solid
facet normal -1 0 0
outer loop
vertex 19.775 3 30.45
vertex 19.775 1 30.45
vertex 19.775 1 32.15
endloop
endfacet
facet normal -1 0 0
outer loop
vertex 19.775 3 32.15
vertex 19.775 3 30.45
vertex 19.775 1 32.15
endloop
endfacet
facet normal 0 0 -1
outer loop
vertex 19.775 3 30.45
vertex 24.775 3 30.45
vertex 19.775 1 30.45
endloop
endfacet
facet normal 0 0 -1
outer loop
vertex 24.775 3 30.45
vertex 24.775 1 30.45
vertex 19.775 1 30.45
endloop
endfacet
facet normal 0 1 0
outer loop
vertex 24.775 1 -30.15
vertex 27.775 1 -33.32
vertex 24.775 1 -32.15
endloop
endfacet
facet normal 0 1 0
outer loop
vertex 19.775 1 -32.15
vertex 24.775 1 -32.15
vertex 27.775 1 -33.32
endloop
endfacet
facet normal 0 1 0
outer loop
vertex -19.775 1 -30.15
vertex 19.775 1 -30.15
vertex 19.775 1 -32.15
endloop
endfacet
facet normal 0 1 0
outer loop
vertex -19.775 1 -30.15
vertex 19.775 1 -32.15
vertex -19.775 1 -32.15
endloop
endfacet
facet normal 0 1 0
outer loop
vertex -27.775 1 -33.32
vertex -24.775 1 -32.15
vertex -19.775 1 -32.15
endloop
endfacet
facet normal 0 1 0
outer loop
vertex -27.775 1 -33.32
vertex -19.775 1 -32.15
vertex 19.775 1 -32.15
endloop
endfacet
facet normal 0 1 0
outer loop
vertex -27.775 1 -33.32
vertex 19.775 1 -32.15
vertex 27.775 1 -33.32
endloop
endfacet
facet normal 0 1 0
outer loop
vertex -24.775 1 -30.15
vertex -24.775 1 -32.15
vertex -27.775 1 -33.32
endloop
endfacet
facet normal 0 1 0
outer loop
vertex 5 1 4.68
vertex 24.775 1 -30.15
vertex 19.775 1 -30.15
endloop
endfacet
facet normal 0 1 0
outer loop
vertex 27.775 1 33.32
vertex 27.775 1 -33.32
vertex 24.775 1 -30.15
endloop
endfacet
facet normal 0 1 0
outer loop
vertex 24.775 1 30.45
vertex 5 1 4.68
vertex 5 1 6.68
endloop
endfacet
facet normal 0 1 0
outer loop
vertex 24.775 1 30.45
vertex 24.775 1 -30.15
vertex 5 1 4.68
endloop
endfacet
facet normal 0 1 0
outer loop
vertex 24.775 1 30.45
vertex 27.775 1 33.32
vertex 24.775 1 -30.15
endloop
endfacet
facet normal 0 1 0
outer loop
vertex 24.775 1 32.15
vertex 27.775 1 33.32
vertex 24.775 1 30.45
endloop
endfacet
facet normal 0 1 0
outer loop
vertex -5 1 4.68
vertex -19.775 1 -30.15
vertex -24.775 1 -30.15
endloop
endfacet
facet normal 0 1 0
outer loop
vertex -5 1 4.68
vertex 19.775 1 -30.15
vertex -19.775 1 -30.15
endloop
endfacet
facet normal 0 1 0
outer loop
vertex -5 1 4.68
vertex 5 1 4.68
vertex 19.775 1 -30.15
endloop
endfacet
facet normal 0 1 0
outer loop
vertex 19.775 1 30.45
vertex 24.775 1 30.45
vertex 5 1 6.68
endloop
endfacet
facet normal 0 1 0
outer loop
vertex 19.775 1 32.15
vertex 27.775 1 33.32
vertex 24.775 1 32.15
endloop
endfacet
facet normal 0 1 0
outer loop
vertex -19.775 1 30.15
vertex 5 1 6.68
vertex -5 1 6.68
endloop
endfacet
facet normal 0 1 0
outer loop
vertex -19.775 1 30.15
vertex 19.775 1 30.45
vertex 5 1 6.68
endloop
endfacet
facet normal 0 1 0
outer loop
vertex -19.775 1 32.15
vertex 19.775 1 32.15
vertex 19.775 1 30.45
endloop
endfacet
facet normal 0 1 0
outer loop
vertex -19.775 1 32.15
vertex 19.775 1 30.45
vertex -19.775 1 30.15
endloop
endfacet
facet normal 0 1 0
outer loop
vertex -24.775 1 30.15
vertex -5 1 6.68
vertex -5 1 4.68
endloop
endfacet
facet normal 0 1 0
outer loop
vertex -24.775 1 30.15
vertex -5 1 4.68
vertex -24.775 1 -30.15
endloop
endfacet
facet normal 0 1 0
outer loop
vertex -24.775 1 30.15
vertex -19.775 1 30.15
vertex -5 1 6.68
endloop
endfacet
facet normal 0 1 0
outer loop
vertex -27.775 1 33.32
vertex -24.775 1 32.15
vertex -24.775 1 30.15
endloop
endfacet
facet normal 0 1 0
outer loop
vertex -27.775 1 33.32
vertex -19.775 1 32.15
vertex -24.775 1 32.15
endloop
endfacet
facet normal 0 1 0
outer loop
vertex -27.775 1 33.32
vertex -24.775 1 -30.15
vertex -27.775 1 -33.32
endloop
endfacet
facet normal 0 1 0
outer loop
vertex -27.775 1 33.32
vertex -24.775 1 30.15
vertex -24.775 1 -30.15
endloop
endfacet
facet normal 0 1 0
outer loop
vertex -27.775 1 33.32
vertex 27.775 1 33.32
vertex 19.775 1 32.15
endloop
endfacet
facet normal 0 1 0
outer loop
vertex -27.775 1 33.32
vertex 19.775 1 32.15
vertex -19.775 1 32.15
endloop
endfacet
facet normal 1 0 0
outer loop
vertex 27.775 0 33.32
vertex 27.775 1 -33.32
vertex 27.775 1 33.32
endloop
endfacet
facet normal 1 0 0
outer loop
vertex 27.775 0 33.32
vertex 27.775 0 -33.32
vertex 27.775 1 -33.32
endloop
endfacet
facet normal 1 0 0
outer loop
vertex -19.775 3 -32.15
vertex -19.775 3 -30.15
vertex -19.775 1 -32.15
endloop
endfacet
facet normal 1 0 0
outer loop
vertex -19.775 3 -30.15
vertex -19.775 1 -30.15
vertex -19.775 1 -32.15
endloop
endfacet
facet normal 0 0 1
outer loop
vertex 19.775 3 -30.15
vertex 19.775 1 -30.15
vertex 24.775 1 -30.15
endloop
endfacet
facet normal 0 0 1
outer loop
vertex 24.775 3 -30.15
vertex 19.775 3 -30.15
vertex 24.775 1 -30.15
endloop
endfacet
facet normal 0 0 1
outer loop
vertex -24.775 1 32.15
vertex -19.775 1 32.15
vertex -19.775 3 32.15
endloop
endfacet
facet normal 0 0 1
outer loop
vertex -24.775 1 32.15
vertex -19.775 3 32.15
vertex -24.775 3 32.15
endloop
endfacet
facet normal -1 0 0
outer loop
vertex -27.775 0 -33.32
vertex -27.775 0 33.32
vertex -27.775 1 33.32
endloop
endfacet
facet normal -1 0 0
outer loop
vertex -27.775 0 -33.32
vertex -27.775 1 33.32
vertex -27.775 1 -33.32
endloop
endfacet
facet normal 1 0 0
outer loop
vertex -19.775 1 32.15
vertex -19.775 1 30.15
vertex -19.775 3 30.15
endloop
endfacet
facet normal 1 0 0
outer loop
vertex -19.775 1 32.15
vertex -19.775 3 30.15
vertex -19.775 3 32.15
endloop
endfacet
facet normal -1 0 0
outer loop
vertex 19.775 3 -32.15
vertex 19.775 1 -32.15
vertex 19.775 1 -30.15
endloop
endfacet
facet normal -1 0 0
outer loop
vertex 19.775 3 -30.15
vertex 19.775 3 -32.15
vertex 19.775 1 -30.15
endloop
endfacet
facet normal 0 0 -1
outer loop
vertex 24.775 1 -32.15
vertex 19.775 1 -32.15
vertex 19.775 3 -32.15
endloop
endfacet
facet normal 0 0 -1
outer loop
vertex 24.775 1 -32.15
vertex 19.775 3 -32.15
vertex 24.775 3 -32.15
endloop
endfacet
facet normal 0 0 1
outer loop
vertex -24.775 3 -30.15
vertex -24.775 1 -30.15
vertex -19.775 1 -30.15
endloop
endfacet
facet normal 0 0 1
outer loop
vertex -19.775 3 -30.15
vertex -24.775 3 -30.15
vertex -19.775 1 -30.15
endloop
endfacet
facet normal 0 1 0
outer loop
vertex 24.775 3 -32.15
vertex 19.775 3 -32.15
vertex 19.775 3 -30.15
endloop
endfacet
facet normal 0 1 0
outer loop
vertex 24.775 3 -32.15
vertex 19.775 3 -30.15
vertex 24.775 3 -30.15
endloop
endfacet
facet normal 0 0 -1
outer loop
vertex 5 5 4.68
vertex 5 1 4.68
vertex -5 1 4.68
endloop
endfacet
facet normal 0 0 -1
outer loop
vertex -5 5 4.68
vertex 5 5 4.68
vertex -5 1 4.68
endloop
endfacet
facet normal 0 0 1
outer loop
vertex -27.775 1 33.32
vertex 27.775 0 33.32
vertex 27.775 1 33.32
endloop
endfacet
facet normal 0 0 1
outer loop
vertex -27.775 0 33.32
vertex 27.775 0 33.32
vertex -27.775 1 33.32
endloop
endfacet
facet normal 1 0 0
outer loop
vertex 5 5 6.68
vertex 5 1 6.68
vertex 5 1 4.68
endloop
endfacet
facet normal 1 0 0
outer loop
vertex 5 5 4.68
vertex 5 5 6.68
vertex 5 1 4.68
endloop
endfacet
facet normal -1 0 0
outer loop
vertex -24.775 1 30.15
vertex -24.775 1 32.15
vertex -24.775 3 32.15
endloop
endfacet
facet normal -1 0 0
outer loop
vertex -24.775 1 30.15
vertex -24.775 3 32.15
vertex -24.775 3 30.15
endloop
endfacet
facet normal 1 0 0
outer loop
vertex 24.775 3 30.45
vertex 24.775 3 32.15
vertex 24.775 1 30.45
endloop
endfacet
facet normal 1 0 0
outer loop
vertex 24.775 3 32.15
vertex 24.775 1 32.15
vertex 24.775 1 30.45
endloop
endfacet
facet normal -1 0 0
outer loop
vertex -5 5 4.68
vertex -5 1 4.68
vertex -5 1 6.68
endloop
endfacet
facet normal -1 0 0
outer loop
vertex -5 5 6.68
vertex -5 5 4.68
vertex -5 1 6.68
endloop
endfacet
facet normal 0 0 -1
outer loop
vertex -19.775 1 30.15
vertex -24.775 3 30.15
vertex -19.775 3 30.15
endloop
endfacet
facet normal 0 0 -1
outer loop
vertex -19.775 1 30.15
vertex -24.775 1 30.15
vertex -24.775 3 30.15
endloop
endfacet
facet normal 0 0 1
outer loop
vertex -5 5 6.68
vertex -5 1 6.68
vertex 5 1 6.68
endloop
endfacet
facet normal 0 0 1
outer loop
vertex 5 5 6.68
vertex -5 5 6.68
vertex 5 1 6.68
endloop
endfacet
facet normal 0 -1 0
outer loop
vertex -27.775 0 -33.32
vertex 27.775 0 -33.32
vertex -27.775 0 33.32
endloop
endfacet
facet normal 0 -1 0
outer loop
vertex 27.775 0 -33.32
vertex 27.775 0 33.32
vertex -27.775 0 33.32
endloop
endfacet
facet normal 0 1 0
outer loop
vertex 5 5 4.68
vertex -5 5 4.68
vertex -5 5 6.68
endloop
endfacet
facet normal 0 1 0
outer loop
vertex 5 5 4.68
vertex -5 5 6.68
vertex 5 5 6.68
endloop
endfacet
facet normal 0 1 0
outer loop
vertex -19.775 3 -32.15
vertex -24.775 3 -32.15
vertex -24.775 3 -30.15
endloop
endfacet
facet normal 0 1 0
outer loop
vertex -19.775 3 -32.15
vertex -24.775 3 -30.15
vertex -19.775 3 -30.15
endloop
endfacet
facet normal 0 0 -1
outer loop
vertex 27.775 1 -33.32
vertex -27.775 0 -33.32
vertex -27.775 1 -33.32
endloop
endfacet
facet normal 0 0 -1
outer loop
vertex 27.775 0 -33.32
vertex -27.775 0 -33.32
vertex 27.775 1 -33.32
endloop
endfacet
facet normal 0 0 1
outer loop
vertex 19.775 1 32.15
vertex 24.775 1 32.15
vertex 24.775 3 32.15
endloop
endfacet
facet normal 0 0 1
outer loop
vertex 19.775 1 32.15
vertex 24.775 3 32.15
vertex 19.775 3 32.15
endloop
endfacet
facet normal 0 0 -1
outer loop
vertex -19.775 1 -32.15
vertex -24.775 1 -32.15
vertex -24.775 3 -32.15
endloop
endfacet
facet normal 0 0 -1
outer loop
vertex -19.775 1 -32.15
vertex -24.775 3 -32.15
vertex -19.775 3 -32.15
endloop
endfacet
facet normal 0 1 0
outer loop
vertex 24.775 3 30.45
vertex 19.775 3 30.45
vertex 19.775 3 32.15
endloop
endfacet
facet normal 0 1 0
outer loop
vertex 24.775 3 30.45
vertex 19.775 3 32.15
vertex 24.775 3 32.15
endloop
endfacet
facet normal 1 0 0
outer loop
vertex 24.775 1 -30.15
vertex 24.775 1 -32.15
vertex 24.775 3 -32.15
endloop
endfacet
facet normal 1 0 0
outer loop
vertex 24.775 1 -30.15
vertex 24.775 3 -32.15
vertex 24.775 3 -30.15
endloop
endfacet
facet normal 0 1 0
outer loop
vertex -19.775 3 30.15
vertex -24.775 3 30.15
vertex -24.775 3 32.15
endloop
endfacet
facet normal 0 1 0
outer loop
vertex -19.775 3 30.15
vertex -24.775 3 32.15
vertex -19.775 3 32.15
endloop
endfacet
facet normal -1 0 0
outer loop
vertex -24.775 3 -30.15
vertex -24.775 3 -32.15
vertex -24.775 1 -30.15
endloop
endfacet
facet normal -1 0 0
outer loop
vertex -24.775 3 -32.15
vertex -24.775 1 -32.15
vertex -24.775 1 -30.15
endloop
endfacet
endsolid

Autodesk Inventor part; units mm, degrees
ref_plane "YZ Plane" through (0, 0, 0) normal (1, 0, 0) x (0, 1, 0)
ref_plane "XZ Plane" through (0, 0, 0) normal (0, 1, 0) x (-1, 0, 0)
ref_plane "XY Plane" through (0, 0, 0) normal (0, 0, 1) x (1, 0, 0)
sketch "Sketch1" plane through (0, 0, 0) normal (0, 1, 0) x (-1, 0, 0)
  line L0 (27.775, -33.32) -> (-27.775, -33.32)
  line L1 (-27.775, -33.32) -> (-27.775, 33.32)
  line L2 (-27.775, 33.32) -> (27.775, 33.32)
  line L3 (27.775, 33.32) -> (27.775, -33.32)
  line L4 (27.775, -33.32) -> (-27.775, 33.32) construction
  line L5 (-27.775, -33.32) -> (27.775, 33.32) construction
  line L6 (26.775, -32.3) -> (-26.775, -32.3)
  line L7 (-26.775, -32.3) -> (-26.775, 32.3)
  line L8 (-26.775, 32.3) -> (26.775, 32.3)
  line L9 (26.775, 32.3) -> (26.775, -32.3)
  line L10 (26.775, -32.3) -> (-26.775, 32.3) construction
  line L11 (-26.775, -32.3) -> (26.775, 32.3) construction
  point P0 (0, 0)
  dimension "d0" = 66.64
  dimension "d1" = 55.55
  dimension "d2" = 64.6
  dimension "d3" = 53.55
extrude "Extrusion1" add sketch "Sketch1" along normal blind 1 contours L0 L1 L2 L3 | L6 L7 L8 L9
sketch "Sketch2" plane through (0, 1, 0) normal (0, 1, 0) x (1, 0, 0)
  line L0 (-26.775, 32.15) -> (26.775, 32.15)
  line L1 (26.775, 32.15) -> (26.775, -32.15)
  line L2 (26.775, -32.15) -> (-26.775, -32.15)
  line L3 (-26.775, -32.15) -> (-26.775, 32.15)
  line L4 (-26.775, 32.15) -> (26.775, -32.15) construction
  line L5 (26.775, 32.15) -> (-26.775, -32.15) construction
  line L6 (-26.775, 32.15) -> (-24.775, 32.15)
  line L7 (-24.775, 32.15) -> (-24.775, 30.15)
  line L8 (-24.775, 30.15) -> (-26.775, 30.15) construction
  line L9 (-26.775, 30.15) -> (-26.775, 32.15)
  line L10 (-24.775, 30.15) -> (-19.775, 30.15)
  line L11 (-19.775, 30.15) -> (-19.775, 32.15)
  line L12 (-19.775, 32.15) -> (-24.775, 32.15)
  line L13 (-24.775, 32.15) -> (-24.775, 30.15)
  line L14 (26.775, 32.15) -> (24.775, 32.15)
  line L15 (24.775, 32.15) -> (24.775, 30.15)
  line L16 (24.775, 30.15) -> (26.775, 30.15) construction
  line L17 (26.775, 30.15) -> (26.775, 32.15)
  line L18 (24.775, 32.15) -> (19.775, 32.15)
  line L19 (19.775, 32.15) -> (19.775, 30.15)
  line L20 (19.775, 30.15) -> (24.775, 30.15)
  line L21 (24.775, 30.15) -> (24.775, 32.15)
  line L22 (-26.775, -32.15) -> (-24.775, -32.15)
  line L23 (-24.775, -32.15) -> (-24.775, -30.15)
  line L24 (-24.775, -30.15) -> (-26.775, -30.15) construction
  line L25 (-26.775, -30.15) -> (-26.775, -32.15)
  line L26 (-24.775, -30.15) -> (-19.775, -30.15)
  line L27 (-19.775, -30.15) -> (-19.775, -32.15)
  line L28 (-19.775, -32.15) -> (-24.775, -32.15)
  line L29 (-24.775, -32.15) -> (-24.775, -30.15)
  line L30 (26.775, -32.15) -> (24.775, -32.15)
  line L31 (24.775, -32.15) -> (24.775, -30.45)
  line L32 (24.775, -30.45) -> (26.775, -30.45) construction
  line L33 (26.775, -30.45) -> (26.775, -32.15)
  line L34 (24.775, -30.45) -> (19.775, -30.45)
  line L35 (19.775, -30.45) -> (19.775, -32.15)
  line L36 (19.775, -32.15) -> (24.775, -32.15)
  line L37 (24.775, -32.15) -> (24.775, -30.45)
  point P0 (0, 0)
  point P1 (-24.775, -32.15)
  point P2 (-24.775, 32.15)
  dimension "d6" = 53.55
  dimension "d7" = 64.3
  dimension "d8" = 2
  dimension "d9" = 2
  dimension "d10" = 5
  dimension "d11" = 2
  dimension "d12" = 2
  dimension "d13" = 5
  dimension "d14" = 2
  dimension "d15" = 2
  dimension "d16" = 5
  dimension "d17" = 2
  dimension "d18" = 5
extrude "Extrusion2" add sketch "Sketch2" along normal blind 2 contours L0 L11 L10 L7 | L0 L15 L20 L19 | L23 L26 L27 L2 | L35 L34 L31 L2
sketch "Sketch3" plane through (0, 1, 0) normal (0, 1, 0) x (1, 0, 0)
  line L0 (27.775, 33.32) -> (-27.775, 33.32) projected
  line L1 (0, 33.32) -> (0, -4.68)
  line L2 (0, -4.68) -> (5, -4.68)
  line L3 (0, -4.68) -> (-5, -4.68)
  line L4 (-5, -4.68) -> (-5, -6.68)
  line L5 (-5, -6.68) -> (5, -6.68)
  line L6 (5, -6.68) -> (5, -4.68)
  point P0 (0, 0)
  dimension "d21" = 38
  dimension "d22" = 5
  dimension "d23" = 5
  dimension "d24" = 2
extrude "Extrusion3" add sketch "Sketch3" along normal blind 4
properties part number "bottomplate"
